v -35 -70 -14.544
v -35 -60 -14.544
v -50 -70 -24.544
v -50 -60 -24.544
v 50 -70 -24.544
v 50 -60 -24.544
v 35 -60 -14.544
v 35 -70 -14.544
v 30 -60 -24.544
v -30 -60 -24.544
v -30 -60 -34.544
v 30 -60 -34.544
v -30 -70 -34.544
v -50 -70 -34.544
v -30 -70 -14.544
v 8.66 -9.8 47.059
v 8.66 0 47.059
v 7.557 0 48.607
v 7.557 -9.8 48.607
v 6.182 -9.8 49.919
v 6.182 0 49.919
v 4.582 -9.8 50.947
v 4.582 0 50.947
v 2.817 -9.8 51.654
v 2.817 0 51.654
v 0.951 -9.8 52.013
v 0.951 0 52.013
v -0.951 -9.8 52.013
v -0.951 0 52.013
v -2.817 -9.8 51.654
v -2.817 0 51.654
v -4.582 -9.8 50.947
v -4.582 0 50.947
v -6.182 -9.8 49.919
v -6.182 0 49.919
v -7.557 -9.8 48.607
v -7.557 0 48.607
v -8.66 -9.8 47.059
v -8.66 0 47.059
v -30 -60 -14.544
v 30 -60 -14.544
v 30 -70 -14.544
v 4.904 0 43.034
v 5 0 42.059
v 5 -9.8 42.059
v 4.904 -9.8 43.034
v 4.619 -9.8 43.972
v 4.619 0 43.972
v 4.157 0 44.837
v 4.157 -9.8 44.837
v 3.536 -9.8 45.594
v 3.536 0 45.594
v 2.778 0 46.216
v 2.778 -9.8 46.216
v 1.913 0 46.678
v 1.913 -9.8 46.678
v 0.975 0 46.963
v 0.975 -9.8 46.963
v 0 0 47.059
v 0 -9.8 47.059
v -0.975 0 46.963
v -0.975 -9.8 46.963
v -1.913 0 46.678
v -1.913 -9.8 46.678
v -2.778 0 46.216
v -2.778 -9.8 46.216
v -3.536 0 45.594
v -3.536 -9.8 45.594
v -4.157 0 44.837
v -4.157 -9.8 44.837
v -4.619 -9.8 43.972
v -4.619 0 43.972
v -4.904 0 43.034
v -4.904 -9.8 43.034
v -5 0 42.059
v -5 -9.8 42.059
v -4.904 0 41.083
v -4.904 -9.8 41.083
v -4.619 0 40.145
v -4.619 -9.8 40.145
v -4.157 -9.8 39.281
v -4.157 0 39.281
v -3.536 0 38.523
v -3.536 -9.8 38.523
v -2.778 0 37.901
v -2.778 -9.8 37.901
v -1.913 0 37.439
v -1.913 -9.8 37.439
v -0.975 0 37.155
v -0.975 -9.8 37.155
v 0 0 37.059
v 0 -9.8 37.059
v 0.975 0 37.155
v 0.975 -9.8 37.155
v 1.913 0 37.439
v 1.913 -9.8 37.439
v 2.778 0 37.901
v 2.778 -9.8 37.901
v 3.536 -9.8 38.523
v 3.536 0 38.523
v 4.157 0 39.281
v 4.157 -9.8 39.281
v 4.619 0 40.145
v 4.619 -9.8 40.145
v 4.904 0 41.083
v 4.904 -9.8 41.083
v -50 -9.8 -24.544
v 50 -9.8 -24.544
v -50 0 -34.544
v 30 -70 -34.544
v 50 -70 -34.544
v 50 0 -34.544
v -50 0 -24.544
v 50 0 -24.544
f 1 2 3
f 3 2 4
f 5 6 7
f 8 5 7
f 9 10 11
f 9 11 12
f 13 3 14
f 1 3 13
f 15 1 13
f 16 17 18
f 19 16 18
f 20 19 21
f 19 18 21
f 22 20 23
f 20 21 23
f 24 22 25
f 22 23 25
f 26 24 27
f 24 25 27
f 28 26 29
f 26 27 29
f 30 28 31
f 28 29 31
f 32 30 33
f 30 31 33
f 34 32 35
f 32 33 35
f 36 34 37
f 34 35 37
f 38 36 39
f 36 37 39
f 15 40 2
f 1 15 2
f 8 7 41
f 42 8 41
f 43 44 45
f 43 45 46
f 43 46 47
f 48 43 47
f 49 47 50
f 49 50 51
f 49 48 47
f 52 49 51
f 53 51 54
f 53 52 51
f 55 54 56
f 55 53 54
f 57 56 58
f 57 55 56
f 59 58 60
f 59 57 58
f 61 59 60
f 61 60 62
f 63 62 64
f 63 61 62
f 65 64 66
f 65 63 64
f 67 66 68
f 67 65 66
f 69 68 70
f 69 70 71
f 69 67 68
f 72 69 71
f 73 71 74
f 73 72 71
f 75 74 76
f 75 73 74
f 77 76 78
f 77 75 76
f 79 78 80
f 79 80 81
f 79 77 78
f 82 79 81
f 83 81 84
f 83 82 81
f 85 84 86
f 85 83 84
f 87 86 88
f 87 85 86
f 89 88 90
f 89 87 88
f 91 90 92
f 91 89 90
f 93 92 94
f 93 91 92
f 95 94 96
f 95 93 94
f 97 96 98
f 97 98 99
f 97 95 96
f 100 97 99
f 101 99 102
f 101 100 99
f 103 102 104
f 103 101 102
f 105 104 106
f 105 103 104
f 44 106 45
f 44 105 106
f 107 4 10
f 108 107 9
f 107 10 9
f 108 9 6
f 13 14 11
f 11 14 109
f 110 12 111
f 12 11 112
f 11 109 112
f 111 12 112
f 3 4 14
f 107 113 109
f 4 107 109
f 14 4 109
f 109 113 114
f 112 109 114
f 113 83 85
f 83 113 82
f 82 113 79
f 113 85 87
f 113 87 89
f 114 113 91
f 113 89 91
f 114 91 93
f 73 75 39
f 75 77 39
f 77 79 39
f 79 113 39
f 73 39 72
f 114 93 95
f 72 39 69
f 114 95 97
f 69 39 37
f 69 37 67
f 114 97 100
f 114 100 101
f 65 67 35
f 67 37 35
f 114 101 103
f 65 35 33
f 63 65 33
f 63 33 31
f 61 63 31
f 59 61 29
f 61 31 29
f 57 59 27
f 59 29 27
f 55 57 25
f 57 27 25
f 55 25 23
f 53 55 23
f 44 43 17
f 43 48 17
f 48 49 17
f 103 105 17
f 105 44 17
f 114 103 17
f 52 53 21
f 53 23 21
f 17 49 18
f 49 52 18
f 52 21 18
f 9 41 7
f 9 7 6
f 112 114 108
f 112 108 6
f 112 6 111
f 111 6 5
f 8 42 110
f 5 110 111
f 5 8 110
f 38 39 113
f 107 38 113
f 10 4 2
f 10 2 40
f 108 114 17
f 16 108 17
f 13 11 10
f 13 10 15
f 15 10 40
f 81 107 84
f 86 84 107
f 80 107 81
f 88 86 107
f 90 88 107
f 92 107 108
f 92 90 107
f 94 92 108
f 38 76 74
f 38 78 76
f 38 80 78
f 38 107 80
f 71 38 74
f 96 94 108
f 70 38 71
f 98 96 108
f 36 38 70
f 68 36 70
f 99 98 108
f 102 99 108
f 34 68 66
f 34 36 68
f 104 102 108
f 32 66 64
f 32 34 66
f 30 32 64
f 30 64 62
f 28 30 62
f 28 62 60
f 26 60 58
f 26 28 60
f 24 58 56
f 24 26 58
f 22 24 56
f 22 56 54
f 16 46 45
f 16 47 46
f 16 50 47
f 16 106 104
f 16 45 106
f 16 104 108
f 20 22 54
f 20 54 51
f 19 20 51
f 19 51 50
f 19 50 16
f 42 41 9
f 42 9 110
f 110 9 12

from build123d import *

# Parameters (mm, degrees)
F0_R     = 5
F1_DEPTH = 9.8
F2_W     = 100
F2_H     = 60
F3_DEPTH = 10
F5_DEPTH = 10


with BuildPart() as f1:
    # F0 (on Front) → F1 (new body)
    with BuildSketch(Plane.XZ):
        with BuildLine():
            Line((50, -24.543892), (8.660254, 47.058649))
            ThreePointArc((8.660254, 47.058649), (0, 52.058649), (-8.660254, 47.058649))
            Line((-8.660254, 47.058649), (-50, -24.543892))
            Line((-50, -24.543892), (50, -24.543892))
        make_face()
        with Locations((0, 42.058649)):
            Circle(F0_R, mode=Mode.SUBTRACT)
    extrude(amount=F1_DEPTH)

    # F2 (on face) → F3 (join)
    with BuildSketch(Plane(origin=(0, 0, -24.543892), x_dir=(1, 0, 0), z_dir=(0, 0, -1))):
        with Locations((0, 30)):
            Rectangle(F2_W, F2_H)
    extrude(amount=F3_DEPTH)

    # F4 (on face) → F5 (join)
    with BuildSketch(Plane.XZ.offset(60)):
        Polygon((-35, -14.543892), (-50, -24.543892), (-50, -34.543892), (-30, -34.543892), (-30, -14.543892), align=None)
        Polygon((50, -34.543892), (50, -24.543892), (35, -14.543892), (30, -14.543892), (30, -34.543892), align=None)
    extrude(amount=F5_DEPTH)


solid = f1.part
